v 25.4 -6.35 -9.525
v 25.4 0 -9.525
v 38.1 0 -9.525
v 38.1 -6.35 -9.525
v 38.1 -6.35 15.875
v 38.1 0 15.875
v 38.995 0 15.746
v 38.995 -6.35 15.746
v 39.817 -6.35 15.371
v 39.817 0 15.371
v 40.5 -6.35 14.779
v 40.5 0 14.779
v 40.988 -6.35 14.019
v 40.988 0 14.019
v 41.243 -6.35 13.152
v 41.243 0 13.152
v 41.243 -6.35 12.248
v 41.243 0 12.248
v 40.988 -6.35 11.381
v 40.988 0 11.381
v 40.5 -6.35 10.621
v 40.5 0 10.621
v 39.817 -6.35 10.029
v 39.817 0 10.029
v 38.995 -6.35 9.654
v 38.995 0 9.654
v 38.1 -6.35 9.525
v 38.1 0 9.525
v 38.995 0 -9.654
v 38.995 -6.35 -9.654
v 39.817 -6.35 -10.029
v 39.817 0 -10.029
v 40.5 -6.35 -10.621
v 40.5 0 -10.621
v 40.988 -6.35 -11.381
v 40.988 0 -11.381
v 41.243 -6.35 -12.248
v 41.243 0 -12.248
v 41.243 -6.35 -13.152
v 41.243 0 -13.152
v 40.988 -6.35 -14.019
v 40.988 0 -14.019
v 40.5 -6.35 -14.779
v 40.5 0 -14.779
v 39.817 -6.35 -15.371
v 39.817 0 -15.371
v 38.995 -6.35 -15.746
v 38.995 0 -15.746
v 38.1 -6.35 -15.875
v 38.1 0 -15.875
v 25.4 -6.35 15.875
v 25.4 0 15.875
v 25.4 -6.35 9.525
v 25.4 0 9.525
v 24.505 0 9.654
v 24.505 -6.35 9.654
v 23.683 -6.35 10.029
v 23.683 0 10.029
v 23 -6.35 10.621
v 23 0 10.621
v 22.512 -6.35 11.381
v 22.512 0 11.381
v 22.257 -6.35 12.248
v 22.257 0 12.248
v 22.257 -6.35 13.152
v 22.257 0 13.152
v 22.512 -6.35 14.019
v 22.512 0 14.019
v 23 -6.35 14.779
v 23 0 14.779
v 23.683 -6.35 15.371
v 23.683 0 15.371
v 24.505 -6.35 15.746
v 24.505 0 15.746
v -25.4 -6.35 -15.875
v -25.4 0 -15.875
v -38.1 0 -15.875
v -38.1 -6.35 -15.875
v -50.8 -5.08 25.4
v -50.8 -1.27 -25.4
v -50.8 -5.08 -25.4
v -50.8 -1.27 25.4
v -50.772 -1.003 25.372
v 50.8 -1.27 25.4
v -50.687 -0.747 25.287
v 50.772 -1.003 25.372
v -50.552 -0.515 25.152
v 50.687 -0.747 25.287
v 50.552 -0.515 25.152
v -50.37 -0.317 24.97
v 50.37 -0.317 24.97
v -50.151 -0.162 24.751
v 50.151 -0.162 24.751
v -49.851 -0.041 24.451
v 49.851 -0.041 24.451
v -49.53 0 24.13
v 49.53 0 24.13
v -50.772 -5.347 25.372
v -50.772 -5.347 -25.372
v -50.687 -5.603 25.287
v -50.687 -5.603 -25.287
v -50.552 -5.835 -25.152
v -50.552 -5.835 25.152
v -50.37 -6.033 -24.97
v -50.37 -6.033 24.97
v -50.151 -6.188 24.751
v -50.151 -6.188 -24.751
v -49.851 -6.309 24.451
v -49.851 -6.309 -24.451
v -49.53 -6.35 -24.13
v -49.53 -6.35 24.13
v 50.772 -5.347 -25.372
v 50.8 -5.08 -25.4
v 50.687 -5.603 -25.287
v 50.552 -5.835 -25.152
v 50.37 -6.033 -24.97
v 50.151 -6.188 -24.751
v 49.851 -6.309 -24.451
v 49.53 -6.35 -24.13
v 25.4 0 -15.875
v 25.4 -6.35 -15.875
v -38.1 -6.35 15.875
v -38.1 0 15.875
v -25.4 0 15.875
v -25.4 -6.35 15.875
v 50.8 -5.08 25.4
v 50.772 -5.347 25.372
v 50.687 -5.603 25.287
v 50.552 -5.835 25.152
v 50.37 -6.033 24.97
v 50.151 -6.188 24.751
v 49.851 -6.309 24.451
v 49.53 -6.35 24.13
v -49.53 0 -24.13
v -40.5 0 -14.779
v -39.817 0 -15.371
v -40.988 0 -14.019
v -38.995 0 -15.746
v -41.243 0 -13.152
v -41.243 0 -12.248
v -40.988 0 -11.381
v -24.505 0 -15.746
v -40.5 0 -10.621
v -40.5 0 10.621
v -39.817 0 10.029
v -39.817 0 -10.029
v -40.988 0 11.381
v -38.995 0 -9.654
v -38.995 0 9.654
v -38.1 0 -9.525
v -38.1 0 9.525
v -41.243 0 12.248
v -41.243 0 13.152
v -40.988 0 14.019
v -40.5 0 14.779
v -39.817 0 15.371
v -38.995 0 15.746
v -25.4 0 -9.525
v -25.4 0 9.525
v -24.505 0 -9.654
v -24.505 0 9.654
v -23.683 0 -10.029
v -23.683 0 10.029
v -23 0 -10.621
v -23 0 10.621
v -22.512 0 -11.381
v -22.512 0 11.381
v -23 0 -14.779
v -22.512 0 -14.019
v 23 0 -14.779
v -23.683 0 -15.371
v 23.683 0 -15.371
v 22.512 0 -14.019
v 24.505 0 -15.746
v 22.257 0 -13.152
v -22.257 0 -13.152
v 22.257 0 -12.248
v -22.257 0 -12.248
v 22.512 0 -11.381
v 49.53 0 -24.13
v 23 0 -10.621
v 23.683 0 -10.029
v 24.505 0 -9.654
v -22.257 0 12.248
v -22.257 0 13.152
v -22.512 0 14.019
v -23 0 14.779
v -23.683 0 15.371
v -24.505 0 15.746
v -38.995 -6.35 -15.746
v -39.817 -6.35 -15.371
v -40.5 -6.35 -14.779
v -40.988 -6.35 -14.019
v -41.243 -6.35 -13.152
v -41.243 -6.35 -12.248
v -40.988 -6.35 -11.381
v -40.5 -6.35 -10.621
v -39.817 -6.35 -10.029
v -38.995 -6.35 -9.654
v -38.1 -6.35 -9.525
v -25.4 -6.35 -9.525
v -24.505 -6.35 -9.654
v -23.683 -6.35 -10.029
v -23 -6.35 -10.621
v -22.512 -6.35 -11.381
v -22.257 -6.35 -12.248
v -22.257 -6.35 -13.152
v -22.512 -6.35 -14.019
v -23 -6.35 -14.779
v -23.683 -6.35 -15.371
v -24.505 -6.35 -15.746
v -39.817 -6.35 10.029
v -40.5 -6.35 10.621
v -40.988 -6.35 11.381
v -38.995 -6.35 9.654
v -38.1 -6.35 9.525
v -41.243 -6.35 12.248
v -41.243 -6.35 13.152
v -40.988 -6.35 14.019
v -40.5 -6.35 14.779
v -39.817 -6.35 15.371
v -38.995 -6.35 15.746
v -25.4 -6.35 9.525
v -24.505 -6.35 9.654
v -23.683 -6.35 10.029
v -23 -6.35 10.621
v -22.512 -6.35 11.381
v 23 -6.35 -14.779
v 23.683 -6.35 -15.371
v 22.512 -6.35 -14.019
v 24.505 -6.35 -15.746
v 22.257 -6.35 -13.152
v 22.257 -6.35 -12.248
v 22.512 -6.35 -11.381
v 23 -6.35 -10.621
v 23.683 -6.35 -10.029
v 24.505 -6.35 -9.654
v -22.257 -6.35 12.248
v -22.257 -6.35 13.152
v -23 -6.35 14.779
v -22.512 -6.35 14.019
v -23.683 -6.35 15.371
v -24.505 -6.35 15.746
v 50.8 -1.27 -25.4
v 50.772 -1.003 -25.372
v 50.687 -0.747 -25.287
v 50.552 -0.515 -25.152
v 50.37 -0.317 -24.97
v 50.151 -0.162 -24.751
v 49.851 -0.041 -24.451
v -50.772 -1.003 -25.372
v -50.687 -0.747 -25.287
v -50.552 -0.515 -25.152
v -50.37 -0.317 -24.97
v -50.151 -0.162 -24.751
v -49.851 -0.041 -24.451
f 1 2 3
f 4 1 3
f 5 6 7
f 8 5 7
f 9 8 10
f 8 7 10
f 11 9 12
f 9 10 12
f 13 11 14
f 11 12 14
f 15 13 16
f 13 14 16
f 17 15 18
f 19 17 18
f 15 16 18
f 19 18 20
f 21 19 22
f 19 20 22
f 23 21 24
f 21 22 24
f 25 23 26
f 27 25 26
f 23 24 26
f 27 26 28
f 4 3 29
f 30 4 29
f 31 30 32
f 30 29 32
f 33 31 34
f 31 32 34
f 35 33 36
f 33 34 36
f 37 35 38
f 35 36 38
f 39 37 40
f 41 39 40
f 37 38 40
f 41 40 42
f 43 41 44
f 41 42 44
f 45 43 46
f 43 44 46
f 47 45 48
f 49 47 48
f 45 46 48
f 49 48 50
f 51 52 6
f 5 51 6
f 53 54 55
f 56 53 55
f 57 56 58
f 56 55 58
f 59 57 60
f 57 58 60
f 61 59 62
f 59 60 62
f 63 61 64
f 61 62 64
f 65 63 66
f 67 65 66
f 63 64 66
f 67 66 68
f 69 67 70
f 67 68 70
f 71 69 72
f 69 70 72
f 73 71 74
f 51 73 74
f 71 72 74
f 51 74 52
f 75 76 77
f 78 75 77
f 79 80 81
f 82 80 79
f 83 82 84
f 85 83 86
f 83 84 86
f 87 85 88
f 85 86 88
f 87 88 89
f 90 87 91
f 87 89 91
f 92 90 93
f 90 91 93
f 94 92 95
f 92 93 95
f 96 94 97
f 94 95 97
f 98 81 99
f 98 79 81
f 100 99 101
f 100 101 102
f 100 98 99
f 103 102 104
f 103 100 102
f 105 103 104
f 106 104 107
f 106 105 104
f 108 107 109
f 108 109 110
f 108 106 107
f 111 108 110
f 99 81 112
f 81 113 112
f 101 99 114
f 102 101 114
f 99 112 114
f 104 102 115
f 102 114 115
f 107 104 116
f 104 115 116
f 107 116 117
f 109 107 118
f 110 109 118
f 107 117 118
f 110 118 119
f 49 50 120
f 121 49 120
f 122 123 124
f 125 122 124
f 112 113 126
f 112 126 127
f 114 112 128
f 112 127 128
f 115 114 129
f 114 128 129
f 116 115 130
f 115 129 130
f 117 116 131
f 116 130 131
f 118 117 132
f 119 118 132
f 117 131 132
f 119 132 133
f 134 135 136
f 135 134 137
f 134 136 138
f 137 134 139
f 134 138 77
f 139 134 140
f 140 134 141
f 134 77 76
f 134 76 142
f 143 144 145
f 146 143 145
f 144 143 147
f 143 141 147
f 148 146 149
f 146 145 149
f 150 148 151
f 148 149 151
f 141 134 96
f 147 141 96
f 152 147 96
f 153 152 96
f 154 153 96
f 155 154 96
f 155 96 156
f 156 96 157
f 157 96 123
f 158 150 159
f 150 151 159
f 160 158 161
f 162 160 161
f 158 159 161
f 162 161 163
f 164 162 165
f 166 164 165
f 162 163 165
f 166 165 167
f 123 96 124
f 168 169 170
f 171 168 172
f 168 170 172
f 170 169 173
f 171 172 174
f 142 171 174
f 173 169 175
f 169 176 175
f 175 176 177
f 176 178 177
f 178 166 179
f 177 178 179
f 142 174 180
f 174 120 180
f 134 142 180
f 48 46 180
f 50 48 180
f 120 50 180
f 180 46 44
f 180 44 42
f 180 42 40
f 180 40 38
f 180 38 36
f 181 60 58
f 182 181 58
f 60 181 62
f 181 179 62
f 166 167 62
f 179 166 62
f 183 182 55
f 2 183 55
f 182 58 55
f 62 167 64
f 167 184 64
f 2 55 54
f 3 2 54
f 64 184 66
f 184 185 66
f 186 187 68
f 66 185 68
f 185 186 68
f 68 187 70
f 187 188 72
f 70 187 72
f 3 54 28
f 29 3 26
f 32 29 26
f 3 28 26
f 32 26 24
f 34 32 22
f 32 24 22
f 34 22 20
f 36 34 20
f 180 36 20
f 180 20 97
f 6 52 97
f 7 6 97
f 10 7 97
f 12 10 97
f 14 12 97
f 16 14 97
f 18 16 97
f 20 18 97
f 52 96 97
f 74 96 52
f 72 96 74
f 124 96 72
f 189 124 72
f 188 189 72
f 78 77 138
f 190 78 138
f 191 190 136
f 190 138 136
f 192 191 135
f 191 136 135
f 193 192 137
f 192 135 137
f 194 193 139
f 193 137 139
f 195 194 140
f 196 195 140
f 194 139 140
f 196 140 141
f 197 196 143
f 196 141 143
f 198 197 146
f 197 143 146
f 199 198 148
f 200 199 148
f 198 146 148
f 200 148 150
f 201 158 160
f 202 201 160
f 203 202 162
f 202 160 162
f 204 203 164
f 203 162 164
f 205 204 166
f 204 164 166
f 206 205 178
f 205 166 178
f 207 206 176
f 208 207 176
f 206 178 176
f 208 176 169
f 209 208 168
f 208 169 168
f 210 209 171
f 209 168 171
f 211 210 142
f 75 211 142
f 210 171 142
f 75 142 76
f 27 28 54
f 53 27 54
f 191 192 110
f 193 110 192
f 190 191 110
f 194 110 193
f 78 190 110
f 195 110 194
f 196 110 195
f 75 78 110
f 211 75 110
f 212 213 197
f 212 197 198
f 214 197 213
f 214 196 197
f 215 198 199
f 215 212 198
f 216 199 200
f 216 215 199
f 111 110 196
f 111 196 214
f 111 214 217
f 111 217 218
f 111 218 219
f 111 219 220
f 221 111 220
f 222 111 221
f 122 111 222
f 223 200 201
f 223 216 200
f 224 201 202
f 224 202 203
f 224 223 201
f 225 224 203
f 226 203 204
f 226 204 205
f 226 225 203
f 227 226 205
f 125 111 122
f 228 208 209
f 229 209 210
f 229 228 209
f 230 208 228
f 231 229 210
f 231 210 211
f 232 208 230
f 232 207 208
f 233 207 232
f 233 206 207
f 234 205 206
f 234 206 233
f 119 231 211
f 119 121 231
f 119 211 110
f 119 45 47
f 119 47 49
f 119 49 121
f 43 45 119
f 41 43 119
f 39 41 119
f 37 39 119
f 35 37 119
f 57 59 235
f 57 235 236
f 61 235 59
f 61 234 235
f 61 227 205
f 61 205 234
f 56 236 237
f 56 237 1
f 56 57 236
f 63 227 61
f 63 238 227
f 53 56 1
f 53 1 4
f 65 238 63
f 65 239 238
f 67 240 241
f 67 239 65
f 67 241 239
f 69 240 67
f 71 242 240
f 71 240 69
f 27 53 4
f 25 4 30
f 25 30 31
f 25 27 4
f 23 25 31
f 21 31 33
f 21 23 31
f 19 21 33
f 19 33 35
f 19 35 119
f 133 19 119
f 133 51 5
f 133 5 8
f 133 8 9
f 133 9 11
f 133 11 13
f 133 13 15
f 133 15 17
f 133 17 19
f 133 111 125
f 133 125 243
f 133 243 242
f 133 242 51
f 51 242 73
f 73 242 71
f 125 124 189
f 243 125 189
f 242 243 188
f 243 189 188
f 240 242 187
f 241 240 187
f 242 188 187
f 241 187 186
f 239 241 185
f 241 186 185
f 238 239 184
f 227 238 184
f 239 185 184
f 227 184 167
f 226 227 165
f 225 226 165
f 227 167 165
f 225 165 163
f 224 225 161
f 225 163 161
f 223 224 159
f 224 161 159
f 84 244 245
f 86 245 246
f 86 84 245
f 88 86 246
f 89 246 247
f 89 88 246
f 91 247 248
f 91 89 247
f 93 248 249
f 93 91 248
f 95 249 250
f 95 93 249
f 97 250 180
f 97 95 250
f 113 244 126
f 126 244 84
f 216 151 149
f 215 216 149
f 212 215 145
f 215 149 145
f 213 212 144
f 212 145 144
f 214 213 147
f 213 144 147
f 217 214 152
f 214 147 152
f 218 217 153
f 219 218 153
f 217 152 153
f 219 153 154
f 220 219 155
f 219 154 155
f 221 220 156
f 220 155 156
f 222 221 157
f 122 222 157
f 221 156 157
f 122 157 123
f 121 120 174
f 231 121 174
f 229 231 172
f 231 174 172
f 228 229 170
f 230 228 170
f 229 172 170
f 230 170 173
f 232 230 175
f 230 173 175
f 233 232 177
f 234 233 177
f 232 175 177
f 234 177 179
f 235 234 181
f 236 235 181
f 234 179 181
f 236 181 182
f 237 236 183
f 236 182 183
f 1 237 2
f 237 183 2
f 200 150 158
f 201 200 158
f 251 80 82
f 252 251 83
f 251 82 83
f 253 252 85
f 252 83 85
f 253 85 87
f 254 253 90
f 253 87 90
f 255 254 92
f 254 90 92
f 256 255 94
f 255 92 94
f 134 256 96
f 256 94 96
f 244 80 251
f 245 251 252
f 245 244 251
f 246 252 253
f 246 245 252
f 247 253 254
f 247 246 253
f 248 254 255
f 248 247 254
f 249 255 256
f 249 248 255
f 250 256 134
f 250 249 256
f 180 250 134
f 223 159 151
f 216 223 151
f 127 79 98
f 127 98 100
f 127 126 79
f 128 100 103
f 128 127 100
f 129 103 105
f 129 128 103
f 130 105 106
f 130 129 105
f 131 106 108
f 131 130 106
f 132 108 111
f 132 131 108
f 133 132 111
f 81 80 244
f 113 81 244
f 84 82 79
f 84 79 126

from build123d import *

# Parameters (mm, degrees)
F0_W     = 101.6
F0_H     = 50.8
F1_DEPTH = 6.35
F2_R     = 1.27


with BuildPart() as f1:
    # F0 (on Front) → F1 (new body)
    with BuildSketch(Plane.XZ):
        Rectangle(F0_W, F0_H)
        with BuildLine():
            Line((-25.4, -15.875), (-38.1, -15.875))
            ThreePointArc((-38.1, -15.875), (-41.275, -12.7), (-38.1, -9.525))
            Line((-38.1, -9.525), (-25.4, -9.525))
            ThreePointArc((-25.4, -9.525), (-22.225, -12.7), (-25.4, -15.875))
        make_face(mode=Mode.SUBTRACT)
        with BuildLine():
            Line((25.4, -9.525), (38.1, -9.525))
            ThreePointArc((38.1, -9.525), (41.275, -12.7), (38.1, -15.875))
            Line((38.1, -15.875), (25.4, -15.875))
            ThreePointArc((25.4, -15.875), (22.225, -12.7), (25.4, -9.525))
        make_face(mode=Mode.SUBTRACT)
        with BuildLine():
            Line((-25.4, 9.525), (-38.1, 9.525))
            ThreePointArc((-38.1, 9.525), (-41.275, 12.7), (-38.1, 15.875))
            Line((-38.1, 15.875), (-25.4, 15.875))
            ThreePointArc((-25.4, 15.875), (-22.225, 12.7), (-25.4, 9.525))
        make_face(mode=Mode.SUBTRACT)
        with BuildLine():
            Line((25.4, 15.875), (38.1, 15.875))
            ThreePointArc((38.1, 15.875), (41.275, 12.7), (38.1, 9.525))
            Line((38.1, 9.525), (25.4, 9.525))
            ThreePointArc((25.4, 9.525), (22.225, 12.7), (25.4, 15.875))
        make_face(mode=Mode.SUBTRACT)
    extrude(amount=F1_DEPTH)

    # F2
    f2_edges = [f1.edges().sort_by_distance(p)[0] for p in [
        (0, 0, -25.4),
        (-50.8, 0, 0),
        (50.8, 0, 0),
        (0, 0, 25.4),
        (0, -6.35, 25.4),
        (-50.8, -6.35, 0),
        (50.8, -6.35, 0),
        (0, -6.35, -25.4),
    ]]
    fillet(f2_edges, radius=F2_R)


solid = f1.part
